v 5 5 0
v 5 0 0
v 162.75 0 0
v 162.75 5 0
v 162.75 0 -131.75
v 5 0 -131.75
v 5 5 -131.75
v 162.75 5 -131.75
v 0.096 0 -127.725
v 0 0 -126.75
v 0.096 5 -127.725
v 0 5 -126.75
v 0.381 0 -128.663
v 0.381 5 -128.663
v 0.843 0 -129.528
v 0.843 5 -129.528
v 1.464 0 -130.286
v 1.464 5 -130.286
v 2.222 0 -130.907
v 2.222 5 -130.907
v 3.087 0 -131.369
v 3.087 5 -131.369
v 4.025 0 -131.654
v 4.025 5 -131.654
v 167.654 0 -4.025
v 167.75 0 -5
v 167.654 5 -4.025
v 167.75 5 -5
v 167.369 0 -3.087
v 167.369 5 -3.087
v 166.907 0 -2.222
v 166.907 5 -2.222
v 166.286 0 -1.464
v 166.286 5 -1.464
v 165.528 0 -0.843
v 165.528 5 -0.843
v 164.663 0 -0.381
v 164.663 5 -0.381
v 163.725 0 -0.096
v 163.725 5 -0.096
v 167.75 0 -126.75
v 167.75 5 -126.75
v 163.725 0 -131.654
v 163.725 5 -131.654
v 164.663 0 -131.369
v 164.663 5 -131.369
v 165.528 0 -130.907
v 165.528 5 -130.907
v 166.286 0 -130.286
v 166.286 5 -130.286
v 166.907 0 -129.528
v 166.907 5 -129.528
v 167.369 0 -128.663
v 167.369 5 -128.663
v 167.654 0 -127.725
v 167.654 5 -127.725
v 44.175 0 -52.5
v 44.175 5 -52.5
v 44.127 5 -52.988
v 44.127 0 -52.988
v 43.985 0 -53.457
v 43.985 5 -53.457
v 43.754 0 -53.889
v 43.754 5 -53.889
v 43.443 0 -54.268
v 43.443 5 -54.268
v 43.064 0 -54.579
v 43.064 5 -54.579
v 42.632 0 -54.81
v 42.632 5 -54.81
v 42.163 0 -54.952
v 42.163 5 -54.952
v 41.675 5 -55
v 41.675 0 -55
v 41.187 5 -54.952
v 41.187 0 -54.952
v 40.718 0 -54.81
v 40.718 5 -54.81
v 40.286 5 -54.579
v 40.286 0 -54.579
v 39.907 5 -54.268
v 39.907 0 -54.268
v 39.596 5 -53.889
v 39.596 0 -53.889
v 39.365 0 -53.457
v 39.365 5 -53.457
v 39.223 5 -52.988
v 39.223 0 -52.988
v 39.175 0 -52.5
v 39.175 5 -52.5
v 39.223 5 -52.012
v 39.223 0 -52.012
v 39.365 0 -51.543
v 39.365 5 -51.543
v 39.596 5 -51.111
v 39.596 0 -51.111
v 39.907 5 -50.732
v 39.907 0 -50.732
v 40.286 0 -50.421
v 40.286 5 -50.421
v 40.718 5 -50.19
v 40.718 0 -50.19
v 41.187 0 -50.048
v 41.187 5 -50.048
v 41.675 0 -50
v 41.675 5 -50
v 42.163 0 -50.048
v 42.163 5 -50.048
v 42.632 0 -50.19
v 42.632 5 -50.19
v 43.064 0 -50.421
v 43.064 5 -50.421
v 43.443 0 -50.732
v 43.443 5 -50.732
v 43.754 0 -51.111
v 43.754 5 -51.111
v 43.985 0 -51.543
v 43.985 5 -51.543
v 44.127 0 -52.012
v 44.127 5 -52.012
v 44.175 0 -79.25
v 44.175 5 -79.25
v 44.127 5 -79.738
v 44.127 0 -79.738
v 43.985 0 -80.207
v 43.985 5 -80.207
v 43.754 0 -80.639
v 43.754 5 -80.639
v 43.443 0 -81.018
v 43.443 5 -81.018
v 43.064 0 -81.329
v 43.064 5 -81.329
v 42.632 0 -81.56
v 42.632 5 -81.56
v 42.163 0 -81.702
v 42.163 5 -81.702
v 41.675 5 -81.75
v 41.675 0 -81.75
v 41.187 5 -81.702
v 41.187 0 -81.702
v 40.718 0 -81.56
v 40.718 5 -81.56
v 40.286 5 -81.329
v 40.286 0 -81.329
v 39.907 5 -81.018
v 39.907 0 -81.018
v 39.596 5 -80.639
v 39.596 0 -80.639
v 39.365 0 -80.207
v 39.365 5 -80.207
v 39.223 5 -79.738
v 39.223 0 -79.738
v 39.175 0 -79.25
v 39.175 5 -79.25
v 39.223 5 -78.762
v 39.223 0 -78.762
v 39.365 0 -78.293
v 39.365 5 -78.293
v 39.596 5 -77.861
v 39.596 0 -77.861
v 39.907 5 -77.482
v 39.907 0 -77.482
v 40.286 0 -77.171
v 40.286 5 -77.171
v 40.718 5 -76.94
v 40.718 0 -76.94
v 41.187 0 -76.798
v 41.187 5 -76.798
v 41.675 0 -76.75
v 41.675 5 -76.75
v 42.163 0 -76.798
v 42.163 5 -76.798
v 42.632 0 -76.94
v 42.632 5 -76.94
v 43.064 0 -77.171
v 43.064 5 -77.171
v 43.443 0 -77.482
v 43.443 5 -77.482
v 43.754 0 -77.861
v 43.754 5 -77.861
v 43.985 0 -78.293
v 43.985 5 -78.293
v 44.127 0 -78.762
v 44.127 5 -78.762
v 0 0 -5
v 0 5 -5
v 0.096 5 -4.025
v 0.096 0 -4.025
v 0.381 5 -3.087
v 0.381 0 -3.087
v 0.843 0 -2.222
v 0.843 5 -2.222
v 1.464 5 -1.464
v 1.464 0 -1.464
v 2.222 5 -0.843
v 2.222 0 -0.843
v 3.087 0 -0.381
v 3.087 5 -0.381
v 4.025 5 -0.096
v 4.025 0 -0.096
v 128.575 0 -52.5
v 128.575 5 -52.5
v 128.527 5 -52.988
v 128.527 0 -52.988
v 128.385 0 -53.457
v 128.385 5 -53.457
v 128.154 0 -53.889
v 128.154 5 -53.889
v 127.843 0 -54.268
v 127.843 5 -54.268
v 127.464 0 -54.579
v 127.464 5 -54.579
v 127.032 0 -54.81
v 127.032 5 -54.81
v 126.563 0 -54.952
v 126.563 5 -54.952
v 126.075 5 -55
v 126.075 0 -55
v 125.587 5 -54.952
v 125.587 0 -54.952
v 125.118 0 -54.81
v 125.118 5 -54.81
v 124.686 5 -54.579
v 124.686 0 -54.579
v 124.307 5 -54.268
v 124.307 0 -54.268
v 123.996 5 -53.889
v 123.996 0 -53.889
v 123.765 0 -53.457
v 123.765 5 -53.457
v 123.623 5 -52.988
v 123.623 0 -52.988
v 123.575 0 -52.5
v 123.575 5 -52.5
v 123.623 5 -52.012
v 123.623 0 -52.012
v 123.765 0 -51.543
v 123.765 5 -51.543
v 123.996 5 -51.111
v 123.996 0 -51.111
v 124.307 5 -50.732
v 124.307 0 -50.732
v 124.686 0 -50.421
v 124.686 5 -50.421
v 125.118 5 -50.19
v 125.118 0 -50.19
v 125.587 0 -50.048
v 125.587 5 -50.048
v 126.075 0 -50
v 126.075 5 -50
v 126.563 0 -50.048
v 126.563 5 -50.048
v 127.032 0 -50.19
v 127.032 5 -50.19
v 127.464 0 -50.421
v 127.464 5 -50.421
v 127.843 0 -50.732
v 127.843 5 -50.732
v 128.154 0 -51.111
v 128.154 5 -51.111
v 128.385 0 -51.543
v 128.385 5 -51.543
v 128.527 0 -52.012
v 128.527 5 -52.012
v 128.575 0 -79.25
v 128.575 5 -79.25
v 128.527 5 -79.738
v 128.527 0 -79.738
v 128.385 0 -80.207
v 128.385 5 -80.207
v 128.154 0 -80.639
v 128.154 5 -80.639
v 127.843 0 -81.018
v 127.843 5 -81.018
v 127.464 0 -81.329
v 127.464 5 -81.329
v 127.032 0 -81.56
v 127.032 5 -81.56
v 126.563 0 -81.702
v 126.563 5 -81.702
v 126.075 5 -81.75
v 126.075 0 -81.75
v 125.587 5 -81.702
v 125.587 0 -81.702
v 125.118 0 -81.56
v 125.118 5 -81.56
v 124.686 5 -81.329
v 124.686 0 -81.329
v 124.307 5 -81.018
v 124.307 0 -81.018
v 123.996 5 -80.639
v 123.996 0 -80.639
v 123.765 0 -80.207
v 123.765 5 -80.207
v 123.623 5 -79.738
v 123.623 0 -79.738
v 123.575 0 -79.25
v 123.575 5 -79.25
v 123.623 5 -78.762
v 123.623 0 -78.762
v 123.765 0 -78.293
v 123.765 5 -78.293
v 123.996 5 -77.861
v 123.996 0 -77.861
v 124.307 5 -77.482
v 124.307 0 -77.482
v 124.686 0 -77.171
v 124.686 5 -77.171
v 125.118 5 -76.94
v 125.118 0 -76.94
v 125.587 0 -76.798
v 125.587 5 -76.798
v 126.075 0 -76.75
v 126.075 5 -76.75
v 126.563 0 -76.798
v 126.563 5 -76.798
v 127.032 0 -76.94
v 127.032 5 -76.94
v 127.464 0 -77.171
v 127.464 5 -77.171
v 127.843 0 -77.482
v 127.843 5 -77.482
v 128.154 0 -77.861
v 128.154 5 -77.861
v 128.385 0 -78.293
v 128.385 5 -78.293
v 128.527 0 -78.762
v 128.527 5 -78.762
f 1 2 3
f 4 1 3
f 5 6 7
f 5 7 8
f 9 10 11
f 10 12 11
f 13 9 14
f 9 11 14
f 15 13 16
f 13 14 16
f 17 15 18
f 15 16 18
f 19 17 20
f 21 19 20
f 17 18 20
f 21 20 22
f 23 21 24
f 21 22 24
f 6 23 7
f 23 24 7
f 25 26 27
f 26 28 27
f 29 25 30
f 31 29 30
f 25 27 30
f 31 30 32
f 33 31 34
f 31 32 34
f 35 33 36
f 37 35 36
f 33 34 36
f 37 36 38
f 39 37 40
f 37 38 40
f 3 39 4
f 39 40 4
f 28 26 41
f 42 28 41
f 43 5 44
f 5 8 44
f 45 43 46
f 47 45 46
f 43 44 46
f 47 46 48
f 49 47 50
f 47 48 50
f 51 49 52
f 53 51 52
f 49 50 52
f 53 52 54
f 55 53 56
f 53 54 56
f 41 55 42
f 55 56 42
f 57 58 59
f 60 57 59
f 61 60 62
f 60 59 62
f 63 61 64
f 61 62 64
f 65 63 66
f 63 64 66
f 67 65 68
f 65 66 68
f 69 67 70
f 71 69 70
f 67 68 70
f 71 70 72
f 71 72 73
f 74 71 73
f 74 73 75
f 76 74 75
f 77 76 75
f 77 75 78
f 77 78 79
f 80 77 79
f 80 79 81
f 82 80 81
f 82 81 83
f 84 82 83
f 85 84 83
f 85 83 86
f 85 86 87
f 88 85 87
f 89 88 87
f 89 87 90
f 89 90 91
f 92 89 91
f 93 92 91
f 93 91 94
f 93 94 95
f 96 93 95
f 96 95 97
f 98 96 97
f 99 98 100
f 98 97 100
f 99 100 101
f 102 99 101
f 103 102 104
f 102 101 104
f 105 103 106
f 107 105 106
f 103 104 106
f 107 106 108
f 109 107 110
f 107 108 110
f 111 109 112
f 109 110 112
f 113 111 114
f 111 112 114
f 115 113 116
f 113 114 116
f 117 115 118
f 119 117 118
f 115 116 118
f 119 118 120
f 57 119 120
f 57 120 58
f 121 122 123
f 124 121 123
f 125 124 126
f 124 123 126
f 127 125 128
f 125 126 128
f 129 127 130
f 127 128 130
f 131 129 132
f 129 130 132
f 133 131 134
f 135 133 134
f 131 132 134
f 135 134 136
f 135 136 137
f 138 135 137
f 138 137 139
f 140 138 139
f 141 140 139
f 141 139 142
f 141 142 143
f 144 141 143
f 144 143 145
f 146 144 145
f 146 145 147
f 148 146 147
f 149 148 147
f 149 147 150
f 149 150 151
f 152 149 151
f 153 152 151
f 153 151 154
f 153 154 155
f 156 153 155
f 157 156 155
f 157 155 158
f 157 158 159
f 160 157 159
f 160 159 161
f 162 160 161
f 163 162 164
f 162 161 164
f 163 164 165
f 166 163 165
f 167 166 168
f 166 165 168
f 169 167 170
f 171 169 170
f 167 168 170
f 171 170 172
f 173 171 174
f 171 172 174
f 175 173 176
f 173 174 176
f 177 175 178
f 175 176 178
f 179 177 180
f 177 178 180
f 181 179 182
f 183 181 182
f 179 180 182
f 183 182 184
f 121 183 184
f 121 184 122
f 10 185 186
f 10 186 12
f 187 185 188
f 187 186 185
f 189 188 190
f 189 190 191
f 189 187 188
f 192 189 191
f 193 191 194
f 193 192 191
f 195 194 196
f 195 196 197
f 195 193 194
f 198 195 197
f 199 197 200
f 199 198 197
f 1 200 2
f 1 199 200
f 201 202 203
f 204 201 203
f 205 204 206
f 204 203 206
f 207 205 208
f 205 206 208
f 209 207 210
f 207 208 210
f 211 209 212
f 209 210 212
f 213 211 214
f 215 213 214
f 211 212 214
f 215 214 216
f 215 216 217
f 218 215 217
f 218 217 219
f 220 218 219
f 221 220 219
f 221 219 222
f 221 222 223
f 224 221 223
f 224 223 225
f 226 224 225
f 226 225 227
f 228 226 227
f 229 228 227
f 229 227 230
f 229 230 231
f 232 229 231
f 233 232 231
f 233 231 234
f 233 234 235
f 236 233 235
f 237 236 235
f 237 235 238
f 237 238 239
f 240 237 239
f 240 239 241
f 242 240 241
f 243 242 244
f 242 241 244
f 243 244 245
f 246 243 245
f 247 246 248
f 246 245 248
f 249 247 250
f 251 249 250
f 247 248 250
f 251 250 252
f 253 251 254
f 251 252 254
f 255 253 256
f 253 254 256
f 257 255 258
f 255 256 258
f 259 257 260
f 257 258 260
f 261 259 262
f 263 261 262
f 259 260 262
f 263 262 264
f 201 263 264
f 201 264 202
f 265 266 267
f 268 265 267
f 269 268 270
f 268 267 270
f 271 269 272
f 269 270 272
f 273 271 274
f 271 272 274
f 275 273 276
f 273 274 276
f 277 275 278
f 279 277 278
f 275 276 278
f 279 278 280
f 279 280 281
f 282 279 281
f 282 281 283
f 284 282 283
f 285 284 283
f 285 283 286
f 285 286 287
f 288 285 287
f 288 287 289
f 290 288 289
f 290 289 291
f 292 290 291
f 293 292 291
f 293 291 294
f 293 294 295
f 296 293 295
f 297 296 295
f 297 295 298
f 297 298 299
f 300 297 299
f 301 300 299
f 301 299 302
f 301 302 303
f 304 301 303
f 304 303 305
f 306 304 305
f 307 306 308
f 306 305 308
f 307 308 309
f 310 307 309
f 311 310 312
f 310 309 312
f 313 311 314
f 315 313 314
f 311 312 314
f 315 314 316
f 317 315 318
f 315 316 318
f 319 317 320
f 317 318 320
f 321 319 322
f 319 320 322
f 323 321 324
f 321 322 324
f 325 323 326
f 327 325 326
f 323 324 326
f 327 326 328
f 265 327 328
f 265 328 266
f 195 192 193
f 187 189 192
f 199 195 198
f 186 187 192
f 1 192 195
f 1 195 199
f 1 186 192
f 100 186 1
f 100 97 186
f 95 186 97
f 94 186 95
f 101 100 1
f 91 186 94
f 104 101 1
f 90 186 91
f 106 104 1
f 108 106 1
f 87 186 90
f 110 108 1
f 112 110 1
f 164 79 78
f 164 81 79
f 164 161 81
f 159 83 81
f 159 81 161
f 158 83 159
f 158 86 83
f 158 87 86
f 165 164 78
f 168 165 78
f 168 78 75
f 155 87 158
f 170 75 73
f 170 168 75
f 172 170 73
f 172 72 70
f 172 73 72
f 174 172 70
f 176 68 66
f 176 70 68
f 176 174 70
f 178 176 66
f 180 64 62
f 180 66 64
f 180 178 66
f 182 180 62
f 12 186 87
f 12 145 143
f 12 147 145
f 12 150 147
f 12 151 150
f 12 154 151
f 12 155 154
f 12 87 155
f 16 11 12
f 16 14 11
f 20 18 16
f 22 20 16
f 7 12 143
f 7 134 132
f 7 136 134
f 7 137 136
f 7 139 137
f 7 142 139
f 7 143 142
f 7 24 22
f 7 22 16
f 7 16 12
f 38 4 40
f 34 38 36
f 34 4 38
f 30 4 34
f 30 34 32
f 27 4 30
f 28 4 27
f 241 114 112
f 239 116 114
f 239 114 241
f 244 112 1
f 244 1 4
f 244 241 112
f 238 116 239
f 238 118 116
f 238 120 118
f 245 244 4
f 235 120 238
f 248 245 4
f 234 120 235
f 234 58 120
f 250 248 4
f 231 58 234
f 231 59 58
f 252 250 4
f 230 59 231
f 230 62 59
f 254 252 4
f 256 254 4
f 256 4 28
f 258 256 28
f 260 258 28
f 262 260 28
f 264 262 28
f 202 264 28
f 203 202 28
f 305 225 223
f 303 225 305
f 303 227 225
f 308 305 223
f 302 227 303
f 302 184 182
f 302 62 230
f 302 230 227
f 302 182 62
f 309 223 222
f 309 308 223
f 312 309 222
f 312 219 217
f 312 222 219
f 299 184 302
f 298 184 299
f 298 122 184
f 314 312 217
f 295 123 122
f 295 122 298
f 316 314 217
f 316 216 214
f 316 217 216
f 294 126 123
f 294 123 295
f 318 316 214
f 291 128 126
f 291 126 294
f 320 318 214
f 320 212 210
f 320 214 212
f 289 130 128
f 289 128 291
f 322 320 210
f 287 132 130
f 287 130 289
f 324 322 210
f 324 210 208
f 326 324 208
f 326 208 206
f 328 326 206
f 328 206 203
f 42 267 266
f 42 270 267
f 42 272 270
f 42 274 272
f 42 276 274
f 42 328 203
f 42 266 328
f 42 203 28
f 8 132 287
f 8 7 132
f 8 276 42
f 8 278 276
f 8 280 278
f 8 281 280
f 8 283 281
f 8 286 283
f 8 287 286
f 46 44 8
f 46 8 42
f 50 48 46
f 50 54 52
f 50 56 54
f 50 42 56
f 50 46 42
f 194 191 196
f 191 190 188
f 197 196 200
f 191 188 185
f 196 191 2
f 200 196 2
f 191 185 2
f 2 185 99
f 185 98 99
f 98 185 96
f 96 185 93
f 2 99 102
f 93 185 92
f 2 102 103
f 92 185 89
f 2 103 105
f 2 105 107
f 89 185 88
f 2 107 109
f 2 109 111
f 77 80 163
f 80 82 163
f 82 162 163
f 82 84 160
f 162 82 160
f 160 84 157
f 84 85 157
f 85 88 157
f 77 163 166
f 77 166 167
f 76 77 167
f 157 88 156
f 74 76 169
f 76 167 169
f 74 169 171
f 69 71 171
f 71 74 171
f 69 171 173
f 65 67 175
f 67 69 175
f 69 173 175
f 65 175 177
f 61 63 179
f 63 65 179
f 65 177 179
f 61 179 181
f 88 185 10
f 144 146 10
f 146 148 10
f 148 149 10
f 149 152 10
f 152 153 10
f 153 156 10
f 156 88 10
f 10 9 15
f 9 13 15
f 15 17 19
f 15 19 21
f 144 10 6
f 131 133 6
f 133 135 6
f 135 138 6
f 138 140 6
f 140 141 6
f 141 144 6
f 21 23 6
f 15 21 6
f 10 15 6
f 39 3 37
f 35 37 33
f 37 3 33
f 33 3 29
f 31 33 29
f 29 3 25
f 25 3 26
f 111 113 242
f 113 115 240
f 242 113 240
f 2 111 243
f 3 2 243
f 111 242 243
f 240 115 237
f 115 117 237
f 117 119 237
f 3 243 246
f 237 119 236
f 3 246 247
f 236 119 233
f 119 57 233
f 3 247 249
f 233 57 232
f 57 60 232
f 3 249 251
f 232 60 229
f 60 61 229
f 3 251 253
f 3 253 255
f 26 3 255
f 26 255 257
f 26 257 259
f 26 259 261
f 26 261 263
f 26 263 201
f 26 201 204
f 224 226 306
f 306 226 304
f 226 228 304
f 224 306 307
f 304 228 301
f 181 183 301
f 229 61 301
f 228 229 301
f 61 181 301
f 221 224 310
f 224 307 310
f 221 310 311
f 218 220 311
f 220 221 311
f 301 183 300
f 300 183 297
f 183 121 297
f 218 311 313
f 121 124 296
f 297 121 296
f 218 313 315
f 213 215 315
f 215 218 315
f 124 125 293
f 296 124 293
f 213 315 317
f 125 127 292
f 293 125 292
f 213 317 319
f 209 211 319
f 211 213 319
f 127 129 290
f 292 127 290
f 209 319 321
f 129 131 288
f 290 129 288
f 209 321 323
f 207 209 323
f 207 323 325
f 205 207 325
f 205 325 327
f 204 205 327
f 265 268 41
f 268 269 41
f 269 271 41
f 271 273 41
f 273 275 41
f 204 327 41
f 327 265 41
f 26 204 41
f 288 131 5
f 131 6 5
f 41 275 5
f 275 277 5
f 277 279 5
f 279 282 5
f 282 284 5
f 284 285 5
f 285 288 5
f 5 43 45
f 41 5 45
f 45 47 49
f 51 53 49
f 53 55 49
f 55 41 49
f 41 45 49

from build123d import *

# Parameters (mm, degrees)
SKETCH_1_W          = 167.75
SKETCH_1_H          = 131.75
EXTRUDE_1_DEPTH     = 5
FILLET_1_R          = 5
FILLET_2_R          = 5
FILLET_3_R          = 5
FILLET_4_R          = 5
SKETCH_2_R          = 2.5
CUT_EXTRUDE_1_DEPTH = 10


with BuildPart() as part:
    # Эскиз1 → Бобышка-Вытянуть1 (new body)
    with BuildSketch(Plane(origin=(0, 0, 0), x_dir=(1, 0, 0), z_dir=(0, 1, 0))):
        with Locations((83.875, 65.875)):
            Rectangle(SKETCH_1_W, SKETCH_1_H)
    extrude(amount=EXTRUDE_1_DEPTH)

    # Скругление1
    fillet_1_edges = [part.edges().sort_by_distance(p)[0] for p in [
        (0, 2.5, 0),
    ]]
    fillet(fillet_1_edges, radius=FILLET_1_R)

    # Скругление2
    fillet_2_edges = [part.edges().sort_by_distance(p)[0] for p in [
        (0, 2.5, -131.75),
    ]]
    fillet(fillet_2_edges, radius=FILLET_2_R)

    # Скругление3
    fillet_3_edges = [part.edges().sort_by_distance(p)[0] for p in [
        (167.75, 2.5, -131.75),
    ]]
    fillet(fillet_3_edges, radius=FILLET_3_R)

    # Скругление4
    fillet_4_edges = [part.edges().sort_by_distance(p)[0] for p in [
        (167.75, 2.5, 0),
    ]]
    fillet(fillet_4_edges, radius=FILLET_4_R)

    # Эскиз2 → Вырез-Вытянуть1 (cut)
    with BuildSketch(Plane(origin=(0, 5, 0), x_dir=(1, 0, 0), z_dir=(0, 1, 0))):
        with Locations((126.075, 79.25)):
            Circle(SKETCH_2_R)
        with Locations((126.075, 52.5)):
            Circle(SKETCH_2_R)
        with Locations((41.675, 79.25)):
            Circle(SKETCH_2_R)
        with Locations((41.675, 52.5)):
            Circle(SKETCH_2_R)
    extrude(amount=-CUT_EXTRUDE_1_DEPTH, mode=Mode.SUBTRACT)


solid = part.part
